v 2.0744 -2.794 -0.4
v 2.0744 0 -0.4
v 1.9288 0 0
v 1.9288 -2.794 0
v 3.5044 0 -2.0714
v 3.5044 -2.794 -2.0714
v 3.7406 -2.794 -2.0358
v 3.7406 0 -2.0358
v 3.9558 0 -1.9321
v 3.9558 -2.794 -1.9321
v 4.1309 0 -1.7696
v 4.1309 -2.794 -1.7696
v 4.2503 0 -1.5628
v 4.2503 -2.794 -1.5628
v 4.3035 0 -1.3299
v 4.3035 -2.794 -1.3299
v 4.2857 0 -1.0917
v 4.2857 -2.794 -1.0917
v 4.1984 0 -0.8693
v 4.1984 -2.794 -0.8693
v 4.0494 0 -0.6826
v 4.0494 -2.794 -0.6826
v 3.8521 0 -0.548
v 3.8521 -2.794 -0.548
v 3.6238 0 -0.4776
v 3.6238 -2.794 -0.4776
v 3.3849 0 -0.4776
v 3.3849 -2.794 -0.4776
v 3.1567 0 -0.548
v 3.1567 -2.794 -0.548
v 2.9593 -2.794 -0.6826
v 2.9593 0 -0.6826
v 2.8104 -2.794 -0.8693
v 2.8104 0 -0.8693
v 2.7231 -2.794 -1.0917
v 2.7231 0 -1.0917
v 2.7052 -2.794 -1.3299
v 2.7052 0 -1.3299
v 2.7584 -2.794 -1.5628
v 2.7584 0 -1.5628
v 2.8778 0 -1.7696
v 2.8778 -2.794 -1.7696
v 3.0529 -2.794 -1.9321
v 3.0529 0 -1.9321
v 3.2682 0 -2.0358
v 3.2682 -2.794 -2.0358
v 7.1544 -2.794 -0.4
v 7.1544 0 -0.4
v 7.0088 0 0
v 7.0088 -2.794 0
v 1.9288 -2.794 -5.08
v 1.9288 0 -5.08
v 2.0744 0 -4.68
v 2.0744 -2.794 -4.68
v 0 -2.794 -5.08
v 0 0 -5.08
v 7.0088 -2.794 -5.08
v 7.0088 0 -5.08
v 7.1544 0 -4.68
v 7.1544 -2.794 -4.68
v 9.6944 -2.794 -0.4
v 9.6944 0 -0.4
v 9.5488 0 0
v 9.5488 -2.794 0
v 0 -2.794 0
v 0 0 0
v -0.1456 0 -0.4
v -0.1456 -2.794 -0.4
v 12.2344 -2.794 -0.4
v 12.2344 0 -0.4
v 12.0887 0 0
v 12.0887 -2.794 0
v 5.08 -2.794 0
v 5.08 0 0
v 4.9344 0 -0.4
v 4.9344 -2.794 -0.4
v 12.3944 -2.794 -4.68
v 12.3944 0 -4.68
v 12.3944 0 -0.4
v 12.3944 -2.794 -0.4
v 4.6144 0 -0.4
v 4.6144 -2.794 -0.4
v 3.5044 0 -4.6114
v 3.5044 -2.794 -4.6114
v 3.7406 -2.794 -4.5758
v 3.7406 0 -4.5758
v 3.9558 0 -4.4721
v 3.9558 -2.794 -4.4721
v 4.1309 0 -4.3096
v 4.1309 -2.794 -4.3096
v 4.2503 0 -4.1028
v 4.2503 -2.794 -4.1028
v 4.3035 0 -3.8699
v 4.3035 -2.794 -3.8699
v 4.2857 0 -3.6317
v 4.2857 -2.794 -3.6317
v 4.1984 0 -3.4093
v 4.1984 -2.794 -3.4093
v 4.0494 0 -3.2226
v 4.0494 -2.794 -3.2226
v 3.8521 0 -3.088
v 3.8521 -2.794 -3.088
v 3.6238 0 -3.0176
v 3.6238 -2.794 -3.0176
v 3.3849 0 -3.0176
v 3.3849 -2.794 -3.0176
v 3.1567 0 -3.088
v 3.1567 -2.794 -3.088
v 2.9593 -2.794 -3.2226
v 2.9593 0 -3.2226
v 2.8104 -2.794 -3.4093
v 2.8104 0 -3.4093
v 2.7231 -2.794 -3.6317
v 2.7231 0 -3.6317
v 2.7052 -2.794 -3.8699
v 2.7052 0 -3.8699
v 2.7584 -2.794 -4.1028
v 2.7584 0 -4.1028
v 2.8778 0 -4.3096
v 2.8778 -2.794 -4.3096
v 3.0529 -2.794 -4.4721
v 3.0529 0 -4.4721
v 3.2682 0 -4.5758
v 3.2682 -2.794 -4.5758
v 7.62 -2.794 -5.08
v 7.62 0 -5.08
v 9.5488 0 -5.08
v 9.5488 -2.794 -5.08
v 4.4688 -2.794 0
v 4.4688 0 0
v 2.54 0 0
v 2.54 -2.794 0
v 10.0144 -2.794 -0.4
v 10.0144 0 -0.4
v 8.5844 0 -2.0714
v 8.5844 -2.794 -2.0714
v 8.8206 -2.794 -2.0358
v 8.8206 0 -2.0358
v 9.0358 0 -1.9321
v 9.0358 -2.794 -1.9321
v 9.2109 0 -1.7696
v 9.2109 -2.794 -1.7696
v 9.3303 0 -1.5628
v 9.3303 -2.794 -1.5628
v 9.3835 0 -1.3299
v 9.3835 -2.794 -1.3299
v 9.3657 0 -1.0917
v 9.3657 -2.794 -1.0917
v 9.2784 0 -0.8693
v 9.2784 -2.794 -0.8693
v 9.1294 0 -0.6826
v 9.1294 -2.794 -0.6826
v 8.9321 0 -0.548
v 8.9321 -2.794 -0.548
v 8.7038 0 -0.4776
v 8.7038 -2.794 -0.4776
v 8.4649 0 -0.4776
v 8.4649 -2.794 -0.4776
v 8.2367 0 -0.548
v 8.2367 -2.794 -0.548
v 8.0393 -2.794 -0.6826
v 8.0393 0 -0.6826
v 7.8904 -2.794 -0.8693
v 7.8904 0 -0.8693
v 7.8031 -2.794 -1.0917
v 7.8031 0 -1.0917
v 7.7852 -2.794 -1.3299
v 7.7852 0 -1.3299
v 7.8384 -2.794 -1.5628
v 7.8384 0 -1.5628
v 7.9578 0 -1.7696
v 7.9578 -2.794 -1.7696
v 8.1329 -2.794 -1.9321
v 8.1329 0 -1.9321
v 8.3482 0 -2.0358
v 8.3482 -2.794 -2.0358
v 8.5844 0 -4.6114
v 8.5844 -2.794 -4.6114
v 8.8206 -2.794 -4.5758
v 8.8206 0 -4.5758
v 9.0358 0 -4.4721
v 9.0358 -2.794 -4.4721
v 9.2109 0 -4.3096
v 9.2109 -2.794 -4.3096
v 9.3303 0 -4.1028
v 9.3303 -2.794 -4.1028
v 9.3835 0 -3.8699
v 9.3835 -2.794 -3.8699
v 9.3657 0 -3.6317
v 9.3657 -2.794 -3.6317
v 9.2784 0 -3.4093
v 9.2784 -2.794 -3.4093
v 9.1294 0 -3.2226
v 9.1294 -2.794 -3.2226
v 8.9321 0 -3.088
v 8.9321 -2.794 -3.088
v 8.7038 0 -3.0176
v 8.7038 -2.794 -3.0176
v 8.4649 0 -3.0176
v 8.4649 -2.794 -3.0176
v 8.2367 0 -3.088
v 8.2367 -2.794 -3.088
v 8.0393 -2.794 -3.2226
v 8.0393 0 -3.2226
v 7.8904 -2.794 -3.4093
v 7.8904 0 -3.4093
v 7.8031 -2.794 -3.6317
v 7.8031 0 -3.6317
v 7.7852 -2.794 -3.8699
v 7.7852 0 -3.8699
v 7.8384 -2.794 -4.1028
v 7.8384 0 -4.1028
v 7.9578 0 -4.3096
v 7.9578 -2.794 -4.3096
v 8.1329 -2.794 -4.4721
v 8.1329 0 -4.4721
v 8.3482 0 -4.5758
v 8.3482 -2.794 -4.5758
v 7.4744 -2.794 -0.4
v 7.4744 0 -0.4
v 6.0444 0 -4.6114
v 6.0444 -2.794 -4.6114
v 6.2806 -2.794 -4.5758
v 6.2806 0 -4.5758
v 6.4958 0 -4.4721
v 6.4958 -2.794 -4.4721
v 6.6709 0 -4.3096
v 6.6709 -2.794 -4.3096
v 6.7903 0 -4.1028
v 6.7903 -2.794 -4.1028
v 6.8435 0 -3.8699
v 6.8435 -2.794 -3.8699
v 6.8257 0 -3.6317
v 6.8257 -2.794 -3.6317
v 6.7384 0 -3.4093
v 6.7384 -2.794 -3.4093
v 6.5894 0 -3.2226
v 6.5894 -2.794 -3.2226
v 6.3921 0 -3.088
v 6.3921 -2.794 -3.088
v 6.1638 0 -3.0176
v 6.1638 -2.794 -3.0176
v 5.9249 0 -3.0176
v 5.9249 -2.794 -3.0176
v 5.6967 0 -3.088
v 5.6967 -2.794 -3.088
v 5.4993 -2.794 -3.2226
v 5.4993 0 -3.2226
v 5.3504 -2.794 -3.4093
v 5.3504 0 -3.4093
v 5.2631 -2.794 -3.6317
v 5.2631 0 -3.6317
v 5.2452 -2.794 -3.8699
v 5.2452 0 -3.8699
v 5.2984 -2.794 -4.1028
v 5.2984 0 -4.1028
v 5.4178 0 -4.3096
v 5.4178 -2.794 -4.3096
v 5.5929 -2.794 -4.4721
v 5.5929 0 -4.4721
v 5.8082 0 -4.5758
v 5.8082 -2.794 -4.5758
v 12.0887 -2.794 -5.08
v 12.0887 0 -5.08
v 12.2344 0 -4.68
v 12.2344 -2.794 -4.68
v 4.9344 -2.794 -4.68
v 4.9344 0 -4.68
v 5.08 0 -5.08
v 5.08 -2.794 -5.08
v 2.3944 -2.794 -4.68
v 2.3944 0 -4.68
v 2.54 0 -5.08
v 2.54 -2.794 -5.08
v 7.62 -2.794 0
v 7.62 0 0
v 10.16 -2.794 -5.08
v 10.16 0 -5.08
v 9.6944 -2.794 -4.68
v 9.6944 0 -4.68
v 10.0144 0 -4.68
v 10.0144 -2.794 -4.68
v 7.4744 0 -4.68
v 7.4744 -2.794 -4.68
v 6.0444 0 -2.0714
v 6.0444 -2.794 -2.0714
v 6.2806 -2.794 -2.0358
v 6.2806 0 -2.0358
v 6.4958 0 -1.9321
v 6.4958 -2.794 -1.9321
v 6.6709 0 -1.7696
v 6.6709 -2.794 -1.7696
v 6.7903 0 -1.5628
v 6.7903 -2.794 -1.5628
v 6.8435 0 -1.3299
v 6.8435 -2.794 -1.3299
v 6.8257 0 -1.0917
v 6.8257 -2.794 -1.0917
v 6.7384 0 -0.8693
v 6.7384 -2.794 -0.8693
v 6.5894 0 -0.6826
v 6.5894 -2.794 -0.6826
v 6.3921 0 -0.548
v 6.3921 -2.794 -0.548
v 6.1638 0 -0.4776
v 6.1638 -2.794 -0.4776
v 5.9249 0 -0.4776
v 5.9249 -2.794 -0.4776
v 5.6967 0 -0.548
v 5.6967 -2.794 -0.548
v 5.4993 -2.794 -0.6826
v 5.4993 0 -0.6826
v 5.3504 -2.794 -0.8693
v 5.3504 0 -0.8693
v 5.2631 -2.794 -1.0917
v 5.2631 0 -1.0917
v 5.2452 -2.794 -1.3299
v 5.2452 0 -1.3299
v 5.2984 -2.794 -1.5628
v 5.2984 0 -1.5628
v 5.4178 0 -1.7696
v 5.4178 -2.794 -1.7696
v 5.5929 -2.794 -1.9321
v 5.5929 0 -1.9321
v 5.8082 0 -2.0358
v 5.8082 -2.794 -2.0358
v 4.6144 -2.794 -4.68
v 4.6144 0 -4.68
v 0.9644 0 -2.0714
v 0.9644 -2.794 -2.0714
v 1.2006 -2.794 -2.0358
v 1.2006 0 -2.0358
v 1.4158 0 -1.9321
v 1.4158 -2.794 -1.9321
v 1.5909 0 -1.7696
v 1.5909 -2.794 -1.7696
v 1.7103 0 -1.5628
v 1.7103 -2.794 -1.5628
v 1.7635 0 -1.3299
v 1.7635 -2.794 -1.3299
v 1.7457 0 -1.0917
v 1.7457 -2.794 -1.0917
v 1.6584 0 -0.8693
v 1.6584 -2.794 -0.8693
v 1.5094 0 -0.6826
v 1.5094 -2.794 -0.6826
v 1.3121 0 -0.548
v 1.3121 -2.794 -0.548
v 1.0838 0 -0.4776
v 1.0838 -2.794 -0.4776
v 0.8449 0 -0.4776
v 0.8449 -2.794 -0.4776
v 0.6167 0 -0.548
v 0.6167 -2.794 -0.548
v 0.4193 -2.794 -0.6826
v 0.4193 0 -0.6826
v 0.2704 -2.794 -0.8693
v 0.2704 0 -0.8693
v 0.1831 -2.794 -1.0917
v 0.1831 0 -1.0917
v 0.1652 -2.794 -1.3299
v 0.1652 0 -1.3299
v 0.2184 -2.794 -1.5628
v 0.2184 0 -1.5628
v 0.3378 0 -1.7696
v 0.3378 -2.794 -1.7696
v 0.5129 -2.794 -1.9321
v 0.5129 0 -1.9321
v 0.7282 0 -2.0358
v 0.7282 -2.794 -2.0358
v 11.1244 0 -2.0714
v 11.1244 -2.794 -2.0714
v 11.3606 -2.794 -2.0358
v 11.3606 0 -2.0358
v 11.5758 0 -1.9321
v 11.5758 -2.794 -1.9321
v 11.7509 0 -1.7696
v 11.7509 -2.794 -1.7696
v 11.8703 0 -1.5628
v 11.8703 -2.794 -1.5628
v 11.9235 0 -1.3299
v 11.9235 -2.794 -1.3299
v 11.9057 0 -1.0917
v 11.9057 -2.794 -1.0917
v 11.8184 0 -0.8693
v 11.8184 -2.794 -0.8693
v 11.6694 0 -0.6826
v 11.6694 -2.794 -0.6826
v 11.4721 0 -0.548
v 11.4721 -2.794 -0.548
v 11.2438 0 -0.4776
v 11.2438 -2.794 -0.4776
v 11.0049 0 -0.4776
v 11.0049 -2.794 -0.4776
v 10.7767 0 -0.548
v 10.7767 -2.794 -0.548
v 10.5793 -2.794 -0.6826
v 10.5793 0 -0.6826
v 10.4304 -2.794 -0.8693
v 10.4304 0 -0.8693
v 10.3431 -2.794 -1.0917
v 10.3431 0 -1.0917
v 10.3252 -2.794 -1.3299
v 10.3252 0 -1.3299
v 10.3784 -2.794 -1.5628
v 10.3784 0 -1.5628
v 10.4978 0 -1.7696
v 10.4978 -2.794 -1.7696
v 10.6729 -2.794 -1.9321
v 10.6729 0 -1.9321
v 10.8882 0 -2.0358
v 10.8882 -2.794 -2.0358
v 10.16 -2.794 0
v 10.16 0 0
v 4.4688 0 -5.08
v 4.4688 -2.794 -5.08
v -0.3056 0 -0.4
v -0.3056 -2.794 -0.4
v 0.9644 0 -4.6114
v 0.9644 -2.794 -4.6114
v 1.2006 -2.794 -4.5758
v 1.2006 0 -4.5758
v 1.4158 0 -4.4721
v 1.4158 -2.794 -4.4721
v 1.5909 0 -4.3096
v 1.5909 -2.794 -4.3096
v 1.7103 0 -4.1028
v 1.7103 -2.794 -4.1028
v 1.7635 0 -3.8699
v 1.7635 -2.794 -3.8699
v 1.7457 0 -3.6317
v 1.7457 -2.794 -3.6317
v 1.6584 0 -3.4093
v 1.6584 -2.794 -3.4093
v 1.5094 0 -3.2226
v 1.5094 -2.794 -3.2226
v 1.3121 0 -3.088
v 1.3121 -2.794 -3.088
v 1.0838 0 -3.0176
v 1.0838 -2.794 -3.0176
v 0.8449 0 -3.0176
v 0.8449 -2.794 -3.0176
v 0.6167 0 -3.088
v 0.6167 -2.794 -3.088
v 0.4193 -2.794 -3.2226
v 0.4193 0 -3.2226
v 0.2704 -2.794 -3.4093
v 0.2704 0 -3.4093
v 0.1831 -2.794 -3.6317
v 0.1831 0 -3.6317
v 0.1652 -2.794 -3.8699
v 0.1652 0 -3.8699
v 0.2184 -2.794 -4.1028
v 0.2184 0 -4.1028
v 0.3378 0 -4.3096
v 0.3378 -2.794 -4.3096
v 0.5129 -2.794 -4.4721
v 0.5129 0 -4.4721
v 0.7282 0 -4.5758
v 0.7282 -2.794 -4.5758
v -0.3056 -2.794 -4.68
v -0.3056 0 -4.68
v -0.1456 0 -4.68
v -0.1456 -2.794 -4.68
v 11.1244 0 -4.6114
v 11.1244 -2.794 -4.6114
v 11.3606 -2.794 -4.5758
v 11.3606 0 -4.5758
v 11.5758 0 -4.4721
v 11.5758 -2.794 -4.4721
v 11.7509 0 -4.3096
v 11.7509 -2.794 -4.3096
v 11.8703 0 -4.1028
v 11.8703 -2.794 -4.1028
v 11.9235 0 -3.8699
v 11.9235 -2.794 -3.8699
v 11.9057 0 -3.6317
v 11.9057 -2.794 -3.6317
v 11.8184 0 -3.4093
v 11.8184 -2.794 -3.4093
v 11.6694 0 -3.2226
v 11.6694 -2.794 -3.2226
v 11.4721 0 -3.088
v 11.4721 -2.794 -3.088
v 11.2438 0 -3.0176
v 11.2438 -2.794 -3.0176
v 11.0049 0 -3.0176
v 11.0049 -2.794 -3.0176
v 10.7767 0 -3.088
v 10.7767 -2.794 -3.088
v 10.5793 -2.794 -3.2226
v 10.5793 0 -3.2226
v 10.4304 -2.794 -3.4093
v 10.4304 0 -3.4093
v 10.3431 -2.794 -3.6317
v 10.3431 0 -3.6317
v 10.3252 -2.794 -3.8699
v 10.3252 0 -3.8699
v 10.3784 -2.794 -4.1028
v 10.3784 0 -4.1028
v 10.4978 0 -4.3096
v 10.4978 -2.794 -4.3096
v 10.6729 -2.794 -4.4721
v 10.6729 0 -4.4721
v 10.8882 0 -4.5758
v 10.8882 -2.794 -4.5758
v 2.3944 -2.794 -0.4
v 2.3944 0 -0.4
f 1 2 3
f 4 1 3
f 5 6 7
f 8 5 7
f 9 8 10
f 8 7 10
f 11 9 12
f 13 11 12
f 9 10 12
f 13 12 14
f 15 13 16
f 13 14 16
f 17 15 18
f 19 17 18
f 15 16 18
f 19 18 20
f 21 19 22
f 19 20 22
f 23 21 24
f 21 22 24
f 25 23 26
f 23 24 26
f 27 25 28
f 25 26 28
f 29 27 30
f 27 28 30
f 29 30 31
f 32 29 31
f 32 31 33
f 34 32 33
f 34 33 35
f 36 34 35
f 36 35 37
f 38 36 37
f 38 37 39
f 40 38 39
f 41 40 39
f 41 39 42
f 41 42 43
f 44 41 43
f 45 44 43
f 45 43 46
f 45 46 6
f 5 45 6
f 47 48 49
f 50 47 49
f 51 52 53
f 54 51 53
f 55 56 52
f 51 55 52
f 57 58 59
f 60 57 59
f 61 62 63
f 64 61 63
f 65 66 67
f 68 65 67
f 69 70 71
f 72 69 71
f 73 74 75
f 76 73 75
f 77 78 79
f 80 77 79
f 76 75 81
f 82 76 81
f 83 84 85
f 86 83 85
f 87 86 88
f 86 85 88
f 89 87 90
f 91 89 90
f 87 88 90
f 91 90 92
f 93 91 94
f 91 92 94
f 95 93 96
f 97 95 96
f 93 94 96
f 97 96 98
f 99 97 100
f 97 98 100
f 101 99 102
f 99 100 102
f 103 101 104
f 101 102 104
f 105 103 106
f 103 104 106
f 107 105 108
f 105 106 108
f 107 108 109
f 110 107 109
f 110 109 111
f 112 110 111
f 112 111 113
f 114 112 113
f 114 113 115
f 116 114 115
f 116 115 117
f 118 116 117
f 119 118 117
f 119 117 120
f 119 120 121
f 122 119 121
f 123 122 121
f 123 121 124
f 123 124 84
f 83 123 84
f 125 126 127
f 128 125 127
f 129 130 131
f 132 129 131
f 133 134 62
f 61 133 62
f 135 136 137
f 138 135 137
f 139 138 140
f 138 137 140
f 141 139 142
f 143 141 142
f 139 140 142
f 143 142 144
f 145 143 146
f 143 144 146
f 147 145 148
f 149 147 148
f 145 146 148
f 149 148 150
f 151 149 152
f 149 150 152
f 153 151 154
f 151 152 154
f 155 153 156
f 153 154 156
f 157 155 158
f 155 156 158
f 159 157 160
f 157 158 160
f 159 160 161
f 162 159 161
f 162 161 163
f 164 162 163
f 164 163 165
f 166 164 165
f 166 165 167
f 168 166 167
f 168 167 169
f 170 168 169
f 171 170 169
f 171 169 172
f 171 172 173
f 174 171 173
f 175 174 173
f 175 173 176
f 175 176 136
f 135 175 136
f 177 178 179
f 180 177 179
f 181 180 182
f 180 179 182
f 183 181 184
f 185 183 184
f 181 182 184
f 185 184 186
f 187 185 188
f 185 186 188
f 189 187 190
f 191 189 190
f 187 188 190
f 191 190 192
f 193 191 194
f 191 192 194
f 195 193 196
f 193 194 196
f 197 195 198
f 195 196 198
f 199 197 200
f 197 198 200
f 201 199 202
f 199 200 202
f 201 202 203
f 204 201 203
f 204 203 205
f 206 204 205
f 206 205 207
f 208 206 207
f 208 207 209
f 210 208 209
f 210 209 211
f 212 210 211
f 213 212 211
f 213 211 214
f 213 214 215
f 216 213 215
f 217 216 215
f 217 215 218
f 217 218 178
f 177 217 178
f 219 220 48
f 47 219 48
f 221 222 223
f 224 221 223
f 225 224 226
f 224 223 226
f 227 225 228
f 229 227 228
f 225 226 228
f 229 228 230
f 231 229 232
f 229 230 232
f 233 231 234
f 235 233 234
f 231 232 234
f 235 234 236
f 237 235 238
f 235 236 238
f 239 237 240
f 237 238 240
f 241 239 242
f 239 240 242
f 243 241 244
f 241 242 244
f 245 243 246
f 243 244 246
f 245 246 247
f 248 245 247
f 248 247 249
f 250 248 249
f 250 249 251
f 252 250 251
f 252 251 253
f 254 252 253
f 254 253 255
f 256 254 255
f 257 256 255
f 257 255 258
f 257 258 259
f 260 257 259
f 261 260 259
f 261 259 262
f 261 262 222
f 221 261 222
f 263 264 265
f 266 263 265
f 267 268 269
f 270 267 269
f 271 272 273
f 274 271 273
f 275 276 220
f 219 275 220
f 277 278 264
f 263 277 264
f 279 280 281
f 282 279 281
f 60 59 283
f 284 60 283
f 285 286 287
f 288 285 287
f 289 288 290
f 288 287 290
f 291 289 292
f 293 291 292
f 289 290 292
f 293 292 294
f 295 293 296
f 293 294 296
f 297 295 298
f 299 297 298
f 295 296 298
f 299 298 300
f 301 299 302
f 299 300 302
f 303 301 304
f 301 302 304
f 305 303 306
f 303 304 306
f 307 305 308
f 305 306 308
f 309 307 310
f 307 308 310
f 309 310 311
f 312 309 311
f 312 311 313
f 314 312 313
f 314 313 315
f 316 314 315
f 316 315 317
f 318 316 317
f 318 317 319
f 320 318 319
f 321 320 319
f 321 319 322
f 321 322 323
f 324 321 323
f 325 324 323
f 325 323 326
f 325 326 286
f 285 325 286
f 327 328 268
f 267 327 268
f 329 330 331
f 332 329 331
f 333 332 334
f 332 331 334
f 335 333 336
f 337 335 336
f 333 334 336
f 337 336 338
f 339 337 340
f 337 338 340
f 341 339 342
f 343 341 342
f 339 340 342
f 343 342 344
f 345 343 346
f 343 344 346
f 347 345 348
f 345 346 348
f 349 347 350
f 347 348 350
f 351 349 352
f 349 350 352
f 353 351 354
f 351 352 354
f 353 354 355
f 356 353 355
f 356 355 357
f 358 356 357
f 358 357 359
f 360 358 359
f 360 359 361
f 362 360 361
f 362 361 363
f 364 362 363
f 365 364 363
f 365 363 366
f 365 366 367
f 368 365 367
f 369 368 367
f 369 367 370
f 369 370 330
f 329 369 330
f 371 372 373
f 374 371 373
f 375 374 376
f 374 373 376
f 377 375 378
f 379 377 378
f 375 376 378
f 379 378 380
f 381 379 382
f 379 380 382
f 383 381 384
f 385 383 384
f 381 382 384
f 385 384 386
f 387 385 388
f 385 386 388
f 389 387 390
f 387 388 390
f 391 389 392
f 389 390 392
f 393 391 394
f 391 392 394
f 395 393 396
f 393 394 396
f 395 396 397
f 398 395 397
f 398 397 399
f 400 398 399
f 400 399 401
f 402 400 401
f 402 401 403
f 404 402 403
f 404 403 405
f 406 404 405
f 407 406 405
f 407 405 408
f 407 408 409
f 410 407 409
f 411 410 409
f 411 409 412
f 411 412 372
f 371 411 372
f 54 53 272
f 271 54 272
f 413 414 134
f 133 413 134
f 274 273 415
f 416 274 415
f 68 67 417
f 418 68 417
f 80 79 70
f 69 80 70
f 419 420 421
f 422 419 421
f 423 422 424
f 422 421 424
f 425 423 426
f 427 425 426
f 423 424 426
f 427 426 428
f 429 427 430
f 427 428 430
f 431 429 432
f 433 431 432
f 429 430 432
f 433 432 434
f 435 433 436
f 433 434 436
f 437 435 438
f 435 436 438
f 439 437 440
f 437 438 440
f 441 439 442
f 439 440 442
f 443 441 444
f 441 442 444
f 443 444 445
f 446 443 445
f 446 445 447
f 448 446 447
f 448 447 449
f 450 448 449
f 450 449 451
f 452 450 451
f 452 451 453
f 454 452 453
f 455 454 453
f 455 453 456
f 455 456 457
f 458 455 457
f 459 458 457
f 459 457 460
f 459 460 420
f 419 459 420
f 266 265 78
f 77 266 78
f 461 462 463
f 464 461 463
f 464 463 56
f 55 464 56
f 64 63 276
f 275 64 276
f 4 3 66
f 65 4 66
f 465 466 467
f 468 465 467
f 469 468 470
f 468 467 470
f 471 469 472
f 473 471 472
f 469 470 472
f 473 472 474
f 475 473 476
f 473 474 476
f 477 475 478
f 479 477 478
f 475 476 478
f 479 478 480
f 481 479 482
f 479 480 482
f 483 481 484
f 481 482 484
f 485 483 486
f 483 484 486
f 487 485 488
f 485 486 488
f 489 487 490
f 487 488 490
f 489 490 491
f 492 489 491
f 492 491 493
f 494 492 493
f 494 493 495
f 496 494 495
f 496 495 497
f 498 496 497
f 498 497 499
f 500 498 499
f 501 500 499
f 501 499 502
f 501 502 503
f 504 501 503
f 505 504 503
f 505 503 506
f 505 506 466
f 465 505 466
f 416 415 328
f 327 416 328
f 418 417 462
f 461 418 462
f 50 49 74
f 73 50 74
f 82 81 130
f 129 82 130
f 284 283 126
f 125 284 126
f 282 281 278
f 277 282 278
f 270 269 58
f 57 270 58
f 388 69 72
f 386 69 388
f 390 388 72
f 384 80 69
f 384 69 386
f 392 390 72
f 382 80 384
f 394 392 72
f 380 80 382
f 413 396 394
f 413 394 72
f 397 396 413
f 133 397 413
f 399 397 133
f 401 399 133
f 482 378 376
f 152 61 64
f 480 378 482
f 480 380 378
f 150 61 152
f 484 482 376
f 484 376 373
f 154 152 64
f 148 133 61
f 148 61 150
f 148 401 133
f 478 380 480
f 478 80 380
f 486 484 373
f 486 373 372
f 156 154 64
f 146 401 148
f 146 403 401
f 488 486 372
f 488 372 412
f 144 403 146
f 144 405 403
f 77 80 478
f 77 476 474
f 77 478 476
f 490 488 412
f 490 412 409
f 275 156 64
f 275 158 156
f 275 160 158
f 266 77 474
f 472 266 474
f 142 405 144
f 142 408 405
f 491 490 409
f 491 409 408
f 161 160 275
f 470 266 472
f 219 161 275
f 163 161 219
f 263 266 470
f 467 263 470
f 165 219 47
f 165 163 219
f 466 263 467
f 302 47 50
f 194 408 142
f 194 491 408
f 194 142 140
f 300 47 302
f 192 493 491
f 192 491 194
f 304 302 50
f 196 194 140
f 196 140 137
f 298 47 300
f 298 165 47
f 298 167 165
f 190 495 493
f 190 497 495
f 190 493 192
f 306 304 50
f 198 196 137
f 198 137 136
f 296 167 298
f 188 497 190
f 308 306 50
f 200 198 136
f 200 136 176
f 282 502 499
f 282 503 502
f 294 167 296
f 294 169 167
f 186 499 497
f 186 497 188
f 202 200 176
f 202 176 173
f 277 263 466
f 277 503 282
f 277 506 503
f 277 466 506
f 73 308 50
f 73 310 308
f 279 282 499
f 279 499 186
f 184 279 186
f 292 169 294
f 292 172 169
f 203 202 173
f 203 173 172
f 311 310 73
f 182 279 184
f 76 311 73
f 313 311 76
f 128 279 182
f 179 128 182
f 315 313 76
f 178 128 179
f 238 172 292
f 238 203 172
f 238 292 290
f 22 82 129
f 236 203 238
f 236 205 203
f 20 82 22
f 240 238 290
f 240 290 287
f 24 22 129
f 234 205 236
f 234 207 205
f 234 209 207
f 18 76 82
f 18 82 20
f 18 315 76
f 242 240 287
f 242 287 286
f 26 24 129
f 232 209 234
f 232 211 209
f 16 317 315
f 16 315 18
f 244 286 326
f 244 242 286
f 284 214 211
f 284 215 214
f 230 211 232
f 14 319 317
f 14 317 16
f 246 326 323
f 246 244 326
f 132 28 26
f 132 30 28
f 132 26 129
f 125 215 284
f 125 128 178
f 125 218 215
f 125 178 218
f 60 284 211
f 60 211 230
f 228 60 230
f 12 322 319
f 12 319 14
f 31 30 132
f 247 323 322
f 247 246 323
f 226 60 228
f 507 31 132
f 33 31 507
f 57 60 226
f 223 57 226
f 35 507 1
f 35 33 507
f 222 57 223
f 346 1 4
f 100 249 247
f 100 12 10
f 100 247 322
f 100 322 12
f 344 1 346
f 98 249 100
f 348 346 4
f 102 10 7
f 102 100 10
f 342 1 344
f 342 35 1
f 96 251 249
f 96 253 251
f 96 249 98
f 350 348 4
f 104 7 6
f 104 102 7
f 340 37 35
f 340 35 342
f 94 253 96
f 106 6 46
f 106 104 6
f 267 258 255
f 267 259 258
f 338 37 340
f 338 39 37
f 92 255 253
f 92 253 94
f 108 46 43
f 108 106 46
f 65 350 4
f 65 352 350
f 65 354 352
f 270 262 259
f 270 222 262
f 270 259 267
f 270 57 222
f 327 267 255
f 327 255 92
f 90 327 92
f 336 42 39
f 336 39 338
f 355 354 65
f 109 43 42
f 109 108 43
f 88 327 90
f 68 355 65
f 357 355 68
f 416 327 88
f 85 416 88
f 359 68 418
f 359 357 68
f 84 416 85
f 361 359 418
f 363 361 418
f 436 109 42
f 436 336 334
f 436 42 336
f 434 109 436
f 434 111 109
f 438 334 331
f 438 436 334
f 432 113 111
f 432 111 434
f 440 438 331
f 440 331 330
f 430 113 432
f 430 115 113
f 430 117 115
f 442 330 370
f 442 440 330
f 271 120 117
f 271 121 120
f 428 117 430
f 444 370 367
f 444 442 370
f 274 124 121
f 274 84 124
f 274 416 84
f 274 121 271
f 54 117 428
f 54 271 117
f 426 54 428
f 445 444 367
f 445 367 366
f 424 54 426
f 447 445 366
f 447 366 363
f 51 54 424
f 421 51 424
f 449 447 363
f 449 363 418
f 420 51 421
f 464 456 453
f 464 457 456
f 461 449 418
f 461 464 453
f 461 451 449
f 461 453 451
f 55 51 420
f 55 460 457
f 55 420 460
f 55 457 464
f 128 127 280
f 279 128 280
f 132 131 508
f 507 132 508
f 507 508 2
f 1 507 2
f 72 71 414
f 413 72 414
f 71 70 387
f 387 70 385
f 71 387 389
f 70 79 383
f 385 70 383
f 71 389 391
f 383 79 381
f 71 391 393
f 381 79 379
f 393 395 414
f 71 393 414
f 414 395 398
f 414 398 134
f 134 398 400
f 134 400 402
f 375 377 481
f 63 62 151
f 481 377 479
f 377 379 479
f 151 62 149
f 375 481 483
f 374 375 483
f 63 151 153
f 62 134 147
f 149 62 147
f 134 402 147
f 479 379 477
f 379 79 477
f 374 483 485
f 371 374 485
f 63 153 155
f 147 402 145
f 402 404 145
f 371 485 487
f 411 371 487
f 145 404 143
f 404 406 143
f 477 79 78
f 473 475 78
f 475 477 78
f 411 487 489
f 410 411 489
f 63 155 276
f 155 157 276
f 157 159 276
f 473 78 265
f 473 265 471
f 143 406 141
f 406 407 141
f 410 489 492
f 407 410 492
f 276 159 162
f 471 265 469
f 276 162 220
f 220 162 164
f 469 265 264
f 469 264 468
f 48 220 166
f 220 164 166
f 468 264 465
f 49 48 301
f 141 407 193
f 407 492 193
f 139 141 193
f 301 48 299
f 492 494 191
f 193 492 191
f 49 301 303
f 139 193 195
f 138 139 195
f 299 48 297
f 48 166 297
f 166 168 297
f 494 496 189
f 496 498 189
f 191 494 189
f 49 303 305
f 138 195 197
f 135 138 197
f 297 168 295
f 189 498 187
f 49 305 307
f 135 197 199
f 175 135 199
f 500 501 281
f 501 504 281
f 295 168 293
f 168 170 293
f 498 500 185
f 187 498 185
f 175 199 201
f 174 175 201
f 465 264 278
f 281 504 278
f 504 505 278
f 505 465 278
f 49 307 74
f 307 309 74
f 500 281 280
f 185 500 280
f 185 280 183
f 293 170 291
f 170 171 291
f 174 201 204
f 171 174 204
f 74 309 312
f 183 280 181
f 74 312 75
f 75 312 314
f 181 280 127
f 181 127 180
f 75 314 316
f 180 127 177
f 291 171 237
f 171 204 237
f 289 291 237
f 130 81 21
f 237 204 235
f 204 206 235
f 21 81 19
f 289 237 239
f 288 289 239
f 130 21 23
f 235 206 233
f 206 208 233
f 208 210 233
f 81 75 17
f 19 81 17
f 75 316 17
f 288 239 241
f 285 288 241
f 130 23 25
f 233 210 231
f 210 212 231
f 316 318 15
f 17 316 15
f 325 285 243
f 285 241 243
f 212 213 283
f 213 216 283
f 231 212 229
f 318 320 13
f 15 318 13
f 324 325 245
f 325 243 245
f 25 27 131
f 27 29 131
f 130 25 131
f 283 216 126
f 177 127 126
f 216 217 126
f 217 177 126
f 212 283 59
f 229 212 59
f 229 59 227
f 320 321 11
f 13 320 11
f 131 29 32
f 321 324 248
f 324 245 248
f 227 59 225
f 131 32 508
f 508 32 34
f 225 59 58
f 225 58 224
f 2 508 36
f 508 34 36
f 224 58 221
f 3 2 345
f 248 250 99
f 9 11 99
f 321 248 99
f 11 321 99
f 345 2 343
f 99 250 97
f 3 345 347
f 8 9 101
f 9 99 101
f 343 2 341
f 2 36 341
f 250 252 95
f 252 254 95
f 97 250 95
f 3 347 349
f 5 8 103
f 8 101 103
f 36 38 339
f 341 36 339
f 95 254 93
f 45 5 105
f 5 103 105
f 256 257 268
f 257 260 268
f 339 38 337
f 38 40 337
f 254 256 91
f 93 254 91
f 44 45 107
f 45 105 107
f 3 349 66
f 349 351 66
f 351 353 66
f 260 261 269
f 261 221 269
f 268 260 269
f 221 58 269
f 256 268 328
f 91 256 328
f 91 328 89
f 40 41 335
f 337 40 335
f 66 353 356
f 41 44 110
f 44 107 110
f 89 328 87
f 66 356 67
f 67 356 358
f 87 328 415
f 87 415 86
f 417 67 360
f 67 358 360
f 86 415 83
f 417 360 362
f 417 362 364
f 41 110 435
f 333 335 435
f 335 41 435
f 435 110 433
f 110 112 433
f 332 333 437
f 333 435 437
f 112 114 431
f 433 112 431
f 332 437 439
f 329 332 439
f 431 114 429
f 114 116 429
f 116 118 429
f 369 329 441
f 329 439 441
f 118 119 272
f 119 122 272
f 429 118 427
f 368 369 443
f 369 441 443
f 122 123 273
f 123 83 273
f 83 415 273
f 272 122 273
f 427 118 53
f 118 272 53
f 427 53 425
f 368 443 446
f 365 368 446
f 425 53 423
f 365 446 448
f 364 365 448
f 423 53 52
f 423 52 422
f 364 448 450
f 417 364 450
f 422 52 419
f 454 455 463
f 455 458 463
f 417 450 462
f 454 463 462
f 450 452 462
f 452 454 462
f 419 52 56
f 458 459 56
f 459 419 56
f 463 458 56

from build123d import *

# Parameters (mm, degrees)
EXTRUDE1_DEPTH       = 2.794
HOLE1_D              = 1.60274
EXTRUDE2_DEPTH       = 2.794
LPATTERN1_COUNT      = 5
LPATTERN1_PITCH      = 2.54
LPATTERN1_COUNT_DIR2 = 2
LPATTERN1_PITCH_DIR2 = 2.54
LPATTERN2_COUNT      = 35
LPATTERN2_PITCH      = 2.54


with BuildPart() as part:
    # Sketch1 → Extrude1 (new body)
    with BuildSketch(Plane(origin=(0, 0, 0), x_dir=(1, 0, 0), z_dir=(0, 1, 0))):
        Polygon((12.394373708, 0.40005), (12.234353708, 0.40005), (12.088747416, 0), (0, 0), (-0.145606292, 0.40005), (-0.305626292, 0.40005), (-0.305626292, 4.67995), (-0.145606292, 4.67995), (0, 5.08), (12.088747416, 5.08), (12.234353708, 4.67995), (12.394373708, 4.67995), align=None)
    extrude(amount=-EXTRUDE1_DEPTH)

    # Hole1 (through all)
    with Locations(Plane(origin=(0.964373708, 0, -1.27), x_dir=(0, 0, 1), z_dir=(0, 1, 0))):
        with Locations((0, 0)):
            hole1 = Hole(HOLE1_D / 2)

    # Sketch4 → Extrude2 (cut)
    with BuildSketch(Plane(origin=(0, 0, 0), x_dir=(1, 0, 0), z_dir=(0, 1, 0))):
        Polygon((1.928772816, 0), (2.5399746, 0), (2.394368308, 0.40005), (2.074379108, 0.40005), align=None)
        Polygon((2.074379108, 4.67995), (2.394368308, 4.67995), (2.5399746, 5.08), (1.928772816, 5.08), align=None)
    extrude2 = extrude(amount=-EXTRUDE2_DEPTH, mode=Mode.SUBTRACT)

    # LPattern1: Hole1 5 × 2
    with Locations(*[(i * LPATTERN1_PITCH, 0, -j * LPATTERN1_PITCH_DIR2) for i in range(LPATTERN1_COUNT) for j in range(LPATTERN1_COUNT_DIR2) if (i, j) != (0, 0)]):
        add(hole1, mode=Mode.SUBTRACT)

    # LPattern2: Extrude2 ×35
    with Locations(*[(i * LPATTERN2_PITCH, 0, 0) for i in range(1, LPATTERN2_COUNT)]):
        add(extrude2, mode=Mode.SUBTRACT)


solid = part.part
